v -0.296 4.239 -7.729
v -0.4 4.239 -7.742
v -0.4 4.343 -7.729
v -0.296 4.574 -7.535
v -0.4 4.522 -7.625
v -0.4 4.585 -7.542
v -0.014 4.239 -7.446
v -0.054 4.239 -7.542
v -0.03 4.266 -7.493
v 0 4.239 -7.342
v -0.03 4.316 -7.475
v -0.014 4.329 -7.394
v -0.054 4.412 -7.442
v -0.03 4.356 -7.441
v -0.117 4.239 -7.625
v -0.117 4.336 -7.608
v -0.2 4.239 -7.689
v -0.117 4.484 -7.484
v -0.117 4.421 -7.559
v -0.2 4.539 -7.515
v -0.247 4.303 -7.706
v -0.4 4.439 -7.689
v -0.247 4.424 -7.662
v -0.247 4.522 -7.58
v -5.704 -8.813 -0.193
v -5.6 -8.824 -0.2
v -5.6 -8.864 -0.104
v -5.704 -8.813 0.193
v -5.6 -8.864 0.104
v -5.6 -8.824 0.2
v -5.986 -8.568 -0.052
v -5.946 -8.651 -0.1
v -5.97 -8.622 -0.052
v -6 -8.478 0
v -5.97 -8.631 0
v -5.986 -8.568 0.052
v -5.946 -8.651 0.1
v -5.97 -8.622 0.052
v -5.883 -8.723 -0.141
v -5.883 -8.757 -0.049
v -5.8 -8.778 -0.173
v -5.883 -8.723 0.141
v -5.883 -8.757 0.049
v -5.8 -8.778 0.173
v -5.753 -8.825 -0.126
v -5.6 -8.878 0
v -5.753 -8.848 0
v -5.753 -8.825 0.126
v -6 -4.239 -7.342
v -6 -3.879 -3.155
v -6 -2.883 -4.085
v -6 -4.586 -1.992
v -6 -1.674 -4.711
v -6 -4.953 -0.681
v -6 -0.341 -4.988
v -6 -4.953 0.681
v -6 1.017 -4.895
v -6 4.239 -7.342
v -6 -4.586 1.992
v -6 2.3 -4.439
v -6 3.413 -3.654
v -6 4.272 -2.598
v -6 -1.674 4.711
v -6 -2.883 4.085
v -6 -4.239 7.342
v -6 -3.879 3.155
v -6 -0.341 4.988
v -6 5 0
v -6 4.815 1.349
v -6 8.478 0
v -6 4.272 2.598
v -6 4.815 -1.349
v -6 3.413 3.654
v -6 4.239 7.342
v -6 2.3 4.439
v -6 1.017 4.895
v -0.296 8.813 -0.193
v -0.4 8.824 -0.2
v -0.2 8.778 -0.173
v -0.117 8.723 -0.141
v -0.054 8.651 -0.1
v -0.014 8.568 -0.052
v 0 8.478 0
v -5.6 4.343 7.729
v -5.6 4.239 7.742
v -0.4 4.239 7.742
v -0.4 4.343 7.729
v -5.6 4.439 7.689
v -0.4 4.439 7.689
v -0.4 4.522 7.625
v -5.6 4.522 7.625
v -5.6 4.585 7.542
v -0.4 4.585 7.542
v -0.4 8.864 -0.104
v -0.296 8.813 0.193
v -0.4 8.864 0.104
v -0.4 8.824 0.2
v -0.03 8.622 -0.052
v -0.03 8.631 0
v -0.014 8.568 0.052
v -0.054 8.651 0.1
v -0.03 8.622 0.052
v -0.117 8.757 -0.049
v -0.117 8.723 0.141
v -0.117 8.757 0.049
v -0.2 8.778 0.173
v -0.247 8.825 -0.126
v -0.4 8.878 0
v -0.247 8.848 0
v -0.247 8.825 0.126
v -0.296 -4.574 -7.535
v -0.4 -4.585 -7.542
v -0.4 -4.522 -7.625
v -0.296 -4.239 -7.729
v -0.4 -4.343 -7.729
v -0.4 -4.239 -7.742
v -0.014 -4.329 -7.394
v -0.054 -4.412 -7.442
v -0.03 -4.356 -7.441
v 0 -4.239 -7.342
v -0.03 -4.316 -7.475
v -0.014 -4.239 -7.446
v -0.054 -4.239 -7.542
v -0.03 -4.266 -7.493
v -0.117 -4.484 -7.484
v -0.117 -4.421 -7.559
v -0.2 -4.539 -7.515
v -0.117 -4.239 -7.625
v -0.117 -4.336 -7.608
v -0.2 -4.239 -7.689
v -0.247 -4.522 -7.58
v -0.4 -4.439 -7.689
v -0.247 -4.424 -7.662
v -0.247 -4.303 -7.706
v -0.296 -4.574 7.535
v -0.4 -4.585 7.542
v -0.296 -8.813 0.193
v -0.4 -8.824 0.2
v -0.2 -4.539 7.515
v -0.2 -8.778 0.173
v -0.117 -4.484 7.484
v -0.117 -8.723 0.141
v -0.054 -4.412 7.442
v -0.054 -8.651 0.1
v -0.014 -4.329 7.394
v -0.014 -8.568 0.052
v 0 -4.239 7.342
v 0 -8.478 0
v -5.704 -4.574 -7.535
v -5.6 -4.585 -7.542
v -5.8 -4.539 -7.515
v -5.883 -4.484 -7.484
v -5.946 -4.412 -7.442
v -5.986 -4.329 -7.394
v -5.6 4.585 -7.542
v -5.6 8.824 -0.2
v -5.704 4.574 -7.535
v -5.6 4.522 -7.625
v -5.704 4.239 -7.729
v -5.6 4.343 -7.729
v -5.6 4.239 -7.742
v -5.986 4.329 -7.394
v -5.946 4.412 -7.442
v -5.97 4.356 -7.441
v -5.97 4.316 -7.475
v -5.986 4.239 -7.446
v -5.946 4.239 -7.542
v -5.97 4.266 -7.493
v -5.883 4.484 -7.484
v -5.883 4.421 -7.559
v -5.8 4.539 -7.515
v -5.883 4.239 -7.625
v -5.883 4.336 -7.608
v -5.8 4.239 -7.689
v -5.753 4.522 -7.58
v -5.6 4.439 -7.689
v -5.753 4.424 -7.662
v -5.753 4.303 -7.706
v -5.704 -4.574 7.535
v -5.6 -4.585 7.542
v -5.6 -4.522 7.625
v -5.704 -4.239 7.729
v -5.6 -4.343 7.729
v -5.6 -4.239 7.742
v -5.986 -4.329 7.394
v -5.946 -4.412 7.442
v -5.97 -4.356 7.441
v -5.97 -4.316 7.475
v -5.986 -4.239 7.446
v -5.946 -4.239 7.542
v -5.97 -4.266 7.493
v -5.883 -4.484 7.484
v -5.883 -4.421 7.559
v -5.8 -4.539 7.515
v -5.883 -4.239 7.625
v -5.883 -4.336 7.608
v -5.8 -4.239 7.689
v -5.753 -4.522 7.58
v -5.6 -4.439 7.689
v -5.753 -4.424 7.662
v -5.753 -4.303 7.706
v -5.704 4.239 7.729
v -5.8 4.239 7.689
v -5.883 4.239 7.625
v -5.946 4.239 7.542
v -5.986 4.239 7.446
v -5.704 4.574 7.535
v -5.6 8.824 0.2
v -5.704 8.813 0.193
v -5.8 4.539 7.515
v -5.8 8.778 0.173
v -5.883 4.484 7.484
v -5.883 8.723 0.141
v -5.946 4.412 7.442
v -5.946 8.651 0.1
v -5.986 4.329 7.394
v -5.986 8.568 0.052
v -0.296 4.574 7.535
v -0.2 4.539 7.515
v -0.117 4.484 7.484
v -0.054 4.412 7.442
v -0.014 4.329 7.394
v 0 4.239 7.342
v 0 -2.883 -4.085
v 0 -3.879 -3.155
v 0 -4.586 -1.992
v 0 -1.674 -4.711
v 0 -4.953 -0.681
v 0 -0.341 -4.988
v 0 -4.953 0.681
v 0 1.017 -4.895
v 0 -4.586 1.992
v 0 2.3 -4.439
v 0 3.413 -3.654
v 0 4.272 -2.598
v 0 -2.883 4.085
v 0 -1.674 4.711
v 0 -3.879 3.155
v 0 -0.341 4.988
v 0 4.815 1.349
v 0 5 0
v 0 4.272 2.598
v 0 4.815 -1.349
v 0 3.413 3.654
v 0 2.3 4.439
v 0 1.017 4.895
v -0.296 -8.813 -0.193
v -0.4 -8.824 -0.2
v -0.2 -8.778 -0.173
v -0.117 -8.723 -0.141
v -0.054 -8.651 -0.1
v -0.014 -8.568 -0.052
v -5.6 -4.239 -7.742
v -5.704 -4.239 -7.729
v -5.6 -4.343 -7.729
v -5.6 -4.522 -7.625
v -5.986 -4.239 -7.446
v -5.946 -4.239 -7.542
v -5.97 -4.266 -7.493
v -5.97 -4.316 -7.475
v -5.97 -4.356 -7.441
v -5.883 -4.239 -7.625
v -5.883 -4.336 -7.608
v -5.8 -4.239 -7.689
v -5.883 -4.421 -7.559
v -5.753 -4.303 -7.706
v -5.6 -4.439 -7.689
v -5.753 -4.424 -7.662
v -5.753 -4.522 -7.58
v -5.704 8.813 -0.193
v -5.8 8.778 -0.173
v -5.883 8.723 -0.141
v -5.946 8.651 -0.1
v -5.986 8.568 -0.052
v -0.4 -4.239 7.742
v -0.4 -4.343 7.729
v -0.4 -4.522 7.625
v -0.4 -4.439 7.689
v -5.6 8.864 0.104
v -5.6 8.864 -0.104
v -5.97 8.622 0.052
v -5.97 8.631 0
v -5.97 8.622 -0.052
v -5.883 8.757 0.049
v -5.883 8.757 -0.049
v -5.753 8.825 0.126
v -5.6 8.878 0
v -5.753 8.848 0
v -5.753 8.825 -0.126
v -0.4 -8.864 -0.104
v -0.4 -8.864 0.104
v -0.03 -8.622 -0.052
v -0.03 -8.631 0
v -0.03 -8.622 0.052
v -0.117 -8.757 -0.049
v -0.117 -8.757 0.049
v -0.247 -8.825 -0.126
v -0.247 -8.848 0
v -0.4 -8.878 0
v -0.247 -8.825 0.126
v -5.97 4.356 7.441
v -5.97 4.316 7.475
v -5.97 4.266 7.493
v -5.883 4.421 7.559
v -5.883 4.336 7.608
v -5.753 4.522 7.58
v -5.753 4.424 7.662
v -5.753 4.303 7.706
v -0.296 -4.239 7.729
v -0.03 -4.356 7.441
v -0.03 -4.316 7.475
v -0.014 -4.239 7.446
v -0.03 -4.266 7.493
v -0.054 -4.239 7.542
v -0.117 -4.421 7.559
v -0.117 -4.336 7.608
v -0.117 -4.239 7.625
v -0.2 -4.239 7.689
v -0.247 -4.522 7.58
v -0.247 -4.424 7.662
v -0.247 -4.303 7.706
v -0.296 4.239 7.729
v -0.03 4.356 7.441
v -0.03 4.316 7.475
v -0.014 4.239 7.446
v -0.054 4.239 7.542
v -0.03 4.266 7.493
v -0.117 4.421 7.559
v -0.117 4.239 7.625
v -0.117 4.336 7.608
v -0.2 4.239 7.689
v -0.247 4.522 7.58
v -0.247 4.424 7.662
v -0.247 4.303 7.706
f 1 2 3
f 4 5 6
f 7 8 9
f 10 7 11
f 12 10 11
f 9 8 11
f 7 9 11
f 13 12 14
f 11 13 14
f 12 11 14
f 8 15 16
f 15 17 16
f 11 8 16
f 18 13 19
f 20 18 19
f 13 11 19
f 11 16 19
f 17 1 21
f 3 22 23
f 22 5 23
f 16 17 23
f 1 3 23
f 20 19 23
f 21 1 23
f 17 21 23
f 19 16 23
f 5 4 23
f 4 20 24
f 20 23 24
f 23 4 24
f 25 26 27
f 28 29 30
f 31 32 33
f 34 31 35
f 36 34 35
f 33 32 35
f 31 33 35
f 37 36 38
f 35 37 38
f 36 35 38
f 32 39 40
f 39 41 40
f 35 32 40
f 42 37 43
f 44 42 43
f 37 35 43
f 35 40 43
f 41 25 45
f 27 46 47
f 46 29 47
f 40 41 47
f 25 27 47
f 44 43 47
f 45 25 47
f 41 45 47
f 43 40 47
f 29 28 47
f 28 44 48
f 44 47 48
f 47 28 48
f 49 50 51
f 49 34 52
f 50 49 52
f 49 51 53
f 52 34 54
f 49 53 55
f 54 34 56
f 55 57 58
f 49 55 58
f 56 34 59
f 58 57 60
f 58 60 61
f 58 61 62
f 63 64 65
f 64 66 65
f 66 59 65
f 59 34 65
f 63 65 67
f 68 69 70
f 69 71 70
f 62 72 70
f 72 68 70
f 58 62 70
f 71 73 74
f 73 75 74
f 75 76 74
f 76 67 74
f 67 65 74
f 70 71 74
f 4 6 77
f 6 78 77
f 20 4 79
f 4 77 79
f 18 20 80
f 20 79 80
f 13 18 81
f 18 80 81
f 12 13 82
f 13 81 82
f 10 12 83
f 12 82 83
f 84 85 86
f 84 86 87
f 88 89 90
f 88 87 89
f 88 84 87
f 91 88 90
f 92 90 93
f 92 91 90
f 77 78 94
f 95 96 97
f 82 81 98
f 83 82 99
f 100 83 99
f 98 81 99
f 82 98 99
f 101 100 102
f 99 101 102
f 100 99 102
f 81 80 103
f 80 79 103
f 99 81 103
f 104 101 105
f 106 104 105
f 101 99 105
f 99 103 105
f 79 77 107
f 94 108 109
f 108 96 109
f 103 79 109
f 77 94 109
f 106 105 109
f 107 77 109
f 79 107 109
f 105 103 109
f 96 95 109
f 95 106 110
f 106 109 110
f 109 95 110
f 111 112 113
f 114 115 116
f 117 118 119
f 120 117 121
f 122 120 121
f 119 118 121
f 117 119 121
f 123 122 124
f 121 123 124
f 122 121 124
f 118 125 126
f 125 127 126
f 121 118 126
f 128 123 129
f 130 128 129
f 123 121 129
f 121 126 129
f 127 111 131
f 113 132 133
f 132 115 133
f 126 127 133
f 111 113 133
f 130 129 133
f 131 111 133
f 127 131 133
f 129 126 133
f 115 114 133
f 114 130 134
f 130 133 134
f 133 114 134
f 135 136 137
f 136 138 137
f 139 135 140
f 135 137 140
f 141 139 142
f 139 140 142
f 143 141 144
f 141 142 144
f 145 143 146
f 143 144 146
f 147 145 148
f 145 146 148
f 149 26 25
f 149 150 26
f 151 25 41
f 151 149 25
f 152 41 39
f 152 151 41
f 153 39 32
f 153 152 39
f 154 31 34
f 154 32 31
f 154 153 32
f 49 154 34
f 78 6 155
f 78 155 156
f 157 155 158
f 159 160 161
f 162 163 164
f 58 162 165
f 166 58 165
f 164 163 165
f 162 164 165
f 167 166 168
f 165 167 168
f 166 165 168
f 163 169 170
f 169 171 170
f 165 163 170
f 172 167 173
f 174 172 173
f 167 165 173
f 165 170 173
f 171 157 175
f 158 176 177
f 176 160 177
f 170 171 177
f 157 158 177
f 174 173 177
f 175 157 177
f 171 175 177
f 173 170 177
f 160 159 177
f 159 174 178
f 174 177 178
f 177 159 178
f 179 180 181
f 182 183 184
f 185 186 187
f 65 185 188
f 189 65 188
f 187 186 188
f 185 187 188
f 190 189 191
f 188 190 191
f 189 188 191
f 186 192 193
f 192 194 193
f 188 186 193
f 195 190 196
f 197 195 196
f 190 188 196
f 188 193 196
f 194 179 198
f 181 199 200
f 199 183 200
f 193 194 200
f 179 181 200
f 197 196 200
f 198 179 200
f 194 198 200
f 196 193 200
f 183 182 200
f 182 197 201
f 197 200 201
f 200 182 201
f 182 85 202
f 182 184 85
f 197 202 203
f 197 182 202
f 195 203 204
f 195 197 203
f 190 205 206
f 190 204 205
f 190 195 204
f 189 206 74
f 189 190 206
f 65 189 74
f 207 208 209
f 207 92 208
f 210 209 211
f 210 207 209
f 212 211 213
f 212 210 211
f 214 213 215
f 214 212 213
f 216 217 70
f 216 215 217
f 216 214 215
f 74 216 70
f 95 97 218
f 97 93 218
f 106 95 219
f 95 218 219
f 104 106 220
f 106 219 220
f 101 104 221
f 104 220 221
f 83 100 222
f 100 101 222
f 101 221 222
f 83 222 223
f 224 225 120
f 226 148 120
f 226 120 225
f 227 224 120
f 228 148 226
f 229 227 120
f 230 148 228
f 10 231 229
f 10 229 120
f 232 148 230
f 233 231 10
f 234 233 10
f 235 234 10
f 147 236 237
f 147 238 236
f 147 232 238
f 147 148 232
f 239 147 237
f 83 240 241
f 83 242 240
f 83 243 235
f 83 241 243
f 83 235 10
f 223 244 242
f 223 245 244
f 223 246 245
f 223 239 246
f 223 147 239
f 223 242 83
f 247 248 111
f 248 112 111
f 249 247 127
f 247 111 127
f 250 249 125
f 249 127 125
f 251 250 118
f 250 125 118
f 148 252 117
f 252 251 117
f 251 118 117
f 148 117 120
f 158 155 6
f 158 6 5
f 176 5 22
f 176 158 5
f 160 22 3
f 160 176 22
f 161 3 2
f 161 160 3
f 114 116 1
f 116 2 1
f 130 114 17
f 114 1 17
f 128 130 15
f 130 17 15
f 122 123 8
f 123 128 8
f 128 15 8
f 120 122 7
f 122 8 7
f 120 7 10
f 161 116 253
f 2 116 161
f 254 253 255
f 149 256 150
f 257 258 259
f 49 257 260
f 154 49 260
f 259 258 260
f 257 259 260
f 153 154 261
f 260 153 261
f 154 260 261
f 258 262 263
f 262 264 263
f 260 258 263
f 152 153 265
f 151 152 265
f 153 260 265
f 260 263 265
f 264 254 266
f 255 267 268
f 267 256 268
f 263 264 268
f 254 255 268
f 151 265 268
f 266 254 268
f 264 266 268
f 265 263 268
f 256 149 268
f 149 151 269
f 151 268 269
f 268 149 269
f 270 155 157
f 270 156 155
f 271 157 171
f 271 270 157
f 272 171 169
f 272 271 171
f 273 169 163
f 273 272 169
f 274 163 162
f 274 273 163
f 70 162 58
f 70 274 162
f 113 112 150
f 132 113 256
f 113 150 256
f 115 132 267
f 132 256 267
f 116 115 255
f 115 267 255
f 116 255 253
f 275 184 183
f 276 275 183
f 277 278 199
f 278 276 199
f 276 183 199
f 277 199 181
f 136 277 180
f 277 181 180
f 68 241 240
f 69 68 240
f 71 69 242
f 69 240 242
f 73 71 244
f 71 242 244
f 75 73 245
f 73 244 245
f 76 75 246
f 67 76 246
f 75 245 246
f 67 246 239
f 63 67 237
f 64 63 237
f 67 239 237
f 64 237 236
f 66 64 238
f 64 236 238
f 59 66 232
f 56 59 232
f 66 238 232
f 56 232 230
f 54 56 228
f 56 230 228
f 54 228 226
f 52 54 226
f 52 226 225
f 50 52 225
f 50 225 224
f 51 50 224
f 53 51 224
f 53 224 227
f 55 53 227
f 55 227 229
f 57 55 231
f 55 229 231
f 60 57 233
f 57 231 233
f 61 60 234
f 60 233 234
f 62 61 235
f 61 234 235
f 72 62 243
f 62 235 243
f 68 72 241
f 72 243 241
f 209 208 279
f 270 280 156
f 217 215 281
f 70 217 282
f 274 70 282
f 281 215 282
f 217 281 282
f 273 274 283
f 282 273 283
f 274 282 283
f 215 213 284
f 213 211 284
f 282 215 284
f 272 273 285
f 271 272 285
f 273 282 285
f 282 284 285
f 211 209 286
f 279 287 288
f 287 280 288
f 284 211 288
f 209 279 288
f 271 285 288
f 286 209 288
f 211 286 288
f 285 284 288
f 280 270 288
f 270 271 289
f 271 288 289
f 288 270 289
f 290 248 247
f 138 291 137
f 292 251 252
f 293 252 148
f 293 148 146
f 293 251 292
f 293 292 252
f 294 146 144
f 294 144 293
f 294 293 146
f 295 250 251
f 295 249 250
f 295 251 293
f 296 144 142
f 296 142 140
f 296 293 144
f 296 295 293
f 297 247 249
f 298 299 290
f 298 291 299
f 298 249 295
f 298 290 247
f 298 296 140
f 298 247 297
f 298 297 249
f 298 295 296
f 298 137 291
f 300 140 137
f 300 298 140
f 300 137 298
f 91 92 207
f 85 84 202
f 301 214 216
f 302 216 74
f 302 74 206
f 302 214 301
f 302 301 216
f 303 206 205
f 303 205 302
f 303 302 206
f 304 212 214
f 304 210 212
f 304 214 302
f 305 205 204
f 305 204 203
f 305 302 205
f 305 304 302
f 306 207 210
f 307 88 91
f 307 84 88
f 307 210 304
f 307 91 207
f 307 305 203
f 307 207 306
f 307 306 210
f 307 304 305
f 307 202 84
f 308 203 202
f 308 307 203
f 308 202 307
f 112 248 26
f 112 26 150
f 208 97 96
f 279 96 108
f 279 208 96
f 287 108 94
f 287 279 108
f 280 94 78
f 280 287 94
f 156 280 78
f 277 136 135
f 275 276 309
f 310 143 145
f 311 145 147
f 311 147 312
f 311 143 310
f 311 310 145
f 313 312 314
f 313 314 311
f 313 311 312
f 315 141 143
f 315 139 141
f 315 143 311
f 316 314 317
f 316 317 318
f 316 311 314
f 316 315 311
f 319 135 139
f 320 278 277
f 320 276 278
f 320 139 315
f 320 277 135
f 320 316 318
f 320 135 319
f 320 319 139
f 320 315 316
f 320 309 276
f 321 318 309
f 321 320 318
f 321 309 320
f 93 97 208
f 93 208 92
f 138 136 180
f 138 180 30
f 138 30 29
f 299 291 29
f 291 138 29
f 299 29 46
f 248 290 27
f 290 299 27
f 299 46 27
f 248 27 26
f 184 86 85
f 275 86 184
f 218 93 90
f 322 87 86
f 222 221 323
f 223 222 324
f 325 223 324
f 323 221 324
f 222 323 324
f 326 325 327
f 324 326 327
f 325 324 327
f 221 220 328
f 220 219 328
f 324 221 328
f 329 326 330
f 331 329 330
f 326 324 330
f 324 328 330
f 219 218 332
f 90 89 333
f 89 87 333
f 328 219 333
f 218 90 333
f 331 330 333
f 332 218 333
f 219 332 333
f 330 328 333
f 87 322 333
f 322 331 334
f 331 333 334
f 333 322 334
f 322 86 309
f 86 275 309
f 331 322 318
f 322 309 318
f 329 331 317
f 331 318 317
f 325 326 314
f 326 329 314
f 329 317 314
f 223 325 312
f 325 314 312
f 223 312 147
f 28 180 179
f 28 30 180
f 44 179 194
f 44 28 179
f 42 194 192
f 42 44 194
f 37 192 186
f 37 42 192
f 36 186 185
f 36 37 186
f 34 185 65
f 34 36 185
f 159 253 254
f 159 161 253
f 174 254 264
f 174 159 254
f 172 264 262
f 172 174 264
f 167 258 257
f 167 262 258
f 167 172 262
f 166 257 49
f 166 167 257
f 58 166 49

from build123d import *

# Parameters (mm, degrees)
F0_R     = 5
F1_DEPTH = 6
F2_R     = 0.4


with BuildPart() as f1:
    # F0 (on Right) → F1 (new body)
    with BuildSketch(Plane.YZ):
        Polygon((4.469955, 7.742188), (-4.469955, 7.742188), (-8.939909, 0), (-4.469955, -7.742188), (4.469955, -7.742188), (8.939909, 0), align=None)
        Circle(F0_R, mode=Mode.SUBTRACT)
    extrude(amount=-F1_DEPTH)

    # F2
    f2_edges = [f1.edges().sort_by_distance(p)[0] for p in [
        (-3, 4.469955, 7.742188),
        (-3, 8.939909, 0),
        (-3, 4.469955, -7.742188),
        (-3, -4.469955, -7.742188),
        (-3, -8.939909, 0),
        (0, -6.704932, -3.871094),
        (0, 0, -7.742188),
        (0, 6.704932, -3.871094),
        (0, 6.704932, 3.871094),
        (-6, 6.704932, 3.871094),
        (-6, 6.704932, -3.871094),
        (-6, 0, -7.742188),
        (-6, -6.704932, -3.871094),
        (-3, -4.469955, 7.742188),
        (0, -6.704932, 3.871094),
        (-6, -6.704932, 3.871094),
        (0, 0, 7.742188),
        (-6, 0, 7.742188),
    ]]
    fillet(f2_edges, radius=F2_R)


solid = f1.part
